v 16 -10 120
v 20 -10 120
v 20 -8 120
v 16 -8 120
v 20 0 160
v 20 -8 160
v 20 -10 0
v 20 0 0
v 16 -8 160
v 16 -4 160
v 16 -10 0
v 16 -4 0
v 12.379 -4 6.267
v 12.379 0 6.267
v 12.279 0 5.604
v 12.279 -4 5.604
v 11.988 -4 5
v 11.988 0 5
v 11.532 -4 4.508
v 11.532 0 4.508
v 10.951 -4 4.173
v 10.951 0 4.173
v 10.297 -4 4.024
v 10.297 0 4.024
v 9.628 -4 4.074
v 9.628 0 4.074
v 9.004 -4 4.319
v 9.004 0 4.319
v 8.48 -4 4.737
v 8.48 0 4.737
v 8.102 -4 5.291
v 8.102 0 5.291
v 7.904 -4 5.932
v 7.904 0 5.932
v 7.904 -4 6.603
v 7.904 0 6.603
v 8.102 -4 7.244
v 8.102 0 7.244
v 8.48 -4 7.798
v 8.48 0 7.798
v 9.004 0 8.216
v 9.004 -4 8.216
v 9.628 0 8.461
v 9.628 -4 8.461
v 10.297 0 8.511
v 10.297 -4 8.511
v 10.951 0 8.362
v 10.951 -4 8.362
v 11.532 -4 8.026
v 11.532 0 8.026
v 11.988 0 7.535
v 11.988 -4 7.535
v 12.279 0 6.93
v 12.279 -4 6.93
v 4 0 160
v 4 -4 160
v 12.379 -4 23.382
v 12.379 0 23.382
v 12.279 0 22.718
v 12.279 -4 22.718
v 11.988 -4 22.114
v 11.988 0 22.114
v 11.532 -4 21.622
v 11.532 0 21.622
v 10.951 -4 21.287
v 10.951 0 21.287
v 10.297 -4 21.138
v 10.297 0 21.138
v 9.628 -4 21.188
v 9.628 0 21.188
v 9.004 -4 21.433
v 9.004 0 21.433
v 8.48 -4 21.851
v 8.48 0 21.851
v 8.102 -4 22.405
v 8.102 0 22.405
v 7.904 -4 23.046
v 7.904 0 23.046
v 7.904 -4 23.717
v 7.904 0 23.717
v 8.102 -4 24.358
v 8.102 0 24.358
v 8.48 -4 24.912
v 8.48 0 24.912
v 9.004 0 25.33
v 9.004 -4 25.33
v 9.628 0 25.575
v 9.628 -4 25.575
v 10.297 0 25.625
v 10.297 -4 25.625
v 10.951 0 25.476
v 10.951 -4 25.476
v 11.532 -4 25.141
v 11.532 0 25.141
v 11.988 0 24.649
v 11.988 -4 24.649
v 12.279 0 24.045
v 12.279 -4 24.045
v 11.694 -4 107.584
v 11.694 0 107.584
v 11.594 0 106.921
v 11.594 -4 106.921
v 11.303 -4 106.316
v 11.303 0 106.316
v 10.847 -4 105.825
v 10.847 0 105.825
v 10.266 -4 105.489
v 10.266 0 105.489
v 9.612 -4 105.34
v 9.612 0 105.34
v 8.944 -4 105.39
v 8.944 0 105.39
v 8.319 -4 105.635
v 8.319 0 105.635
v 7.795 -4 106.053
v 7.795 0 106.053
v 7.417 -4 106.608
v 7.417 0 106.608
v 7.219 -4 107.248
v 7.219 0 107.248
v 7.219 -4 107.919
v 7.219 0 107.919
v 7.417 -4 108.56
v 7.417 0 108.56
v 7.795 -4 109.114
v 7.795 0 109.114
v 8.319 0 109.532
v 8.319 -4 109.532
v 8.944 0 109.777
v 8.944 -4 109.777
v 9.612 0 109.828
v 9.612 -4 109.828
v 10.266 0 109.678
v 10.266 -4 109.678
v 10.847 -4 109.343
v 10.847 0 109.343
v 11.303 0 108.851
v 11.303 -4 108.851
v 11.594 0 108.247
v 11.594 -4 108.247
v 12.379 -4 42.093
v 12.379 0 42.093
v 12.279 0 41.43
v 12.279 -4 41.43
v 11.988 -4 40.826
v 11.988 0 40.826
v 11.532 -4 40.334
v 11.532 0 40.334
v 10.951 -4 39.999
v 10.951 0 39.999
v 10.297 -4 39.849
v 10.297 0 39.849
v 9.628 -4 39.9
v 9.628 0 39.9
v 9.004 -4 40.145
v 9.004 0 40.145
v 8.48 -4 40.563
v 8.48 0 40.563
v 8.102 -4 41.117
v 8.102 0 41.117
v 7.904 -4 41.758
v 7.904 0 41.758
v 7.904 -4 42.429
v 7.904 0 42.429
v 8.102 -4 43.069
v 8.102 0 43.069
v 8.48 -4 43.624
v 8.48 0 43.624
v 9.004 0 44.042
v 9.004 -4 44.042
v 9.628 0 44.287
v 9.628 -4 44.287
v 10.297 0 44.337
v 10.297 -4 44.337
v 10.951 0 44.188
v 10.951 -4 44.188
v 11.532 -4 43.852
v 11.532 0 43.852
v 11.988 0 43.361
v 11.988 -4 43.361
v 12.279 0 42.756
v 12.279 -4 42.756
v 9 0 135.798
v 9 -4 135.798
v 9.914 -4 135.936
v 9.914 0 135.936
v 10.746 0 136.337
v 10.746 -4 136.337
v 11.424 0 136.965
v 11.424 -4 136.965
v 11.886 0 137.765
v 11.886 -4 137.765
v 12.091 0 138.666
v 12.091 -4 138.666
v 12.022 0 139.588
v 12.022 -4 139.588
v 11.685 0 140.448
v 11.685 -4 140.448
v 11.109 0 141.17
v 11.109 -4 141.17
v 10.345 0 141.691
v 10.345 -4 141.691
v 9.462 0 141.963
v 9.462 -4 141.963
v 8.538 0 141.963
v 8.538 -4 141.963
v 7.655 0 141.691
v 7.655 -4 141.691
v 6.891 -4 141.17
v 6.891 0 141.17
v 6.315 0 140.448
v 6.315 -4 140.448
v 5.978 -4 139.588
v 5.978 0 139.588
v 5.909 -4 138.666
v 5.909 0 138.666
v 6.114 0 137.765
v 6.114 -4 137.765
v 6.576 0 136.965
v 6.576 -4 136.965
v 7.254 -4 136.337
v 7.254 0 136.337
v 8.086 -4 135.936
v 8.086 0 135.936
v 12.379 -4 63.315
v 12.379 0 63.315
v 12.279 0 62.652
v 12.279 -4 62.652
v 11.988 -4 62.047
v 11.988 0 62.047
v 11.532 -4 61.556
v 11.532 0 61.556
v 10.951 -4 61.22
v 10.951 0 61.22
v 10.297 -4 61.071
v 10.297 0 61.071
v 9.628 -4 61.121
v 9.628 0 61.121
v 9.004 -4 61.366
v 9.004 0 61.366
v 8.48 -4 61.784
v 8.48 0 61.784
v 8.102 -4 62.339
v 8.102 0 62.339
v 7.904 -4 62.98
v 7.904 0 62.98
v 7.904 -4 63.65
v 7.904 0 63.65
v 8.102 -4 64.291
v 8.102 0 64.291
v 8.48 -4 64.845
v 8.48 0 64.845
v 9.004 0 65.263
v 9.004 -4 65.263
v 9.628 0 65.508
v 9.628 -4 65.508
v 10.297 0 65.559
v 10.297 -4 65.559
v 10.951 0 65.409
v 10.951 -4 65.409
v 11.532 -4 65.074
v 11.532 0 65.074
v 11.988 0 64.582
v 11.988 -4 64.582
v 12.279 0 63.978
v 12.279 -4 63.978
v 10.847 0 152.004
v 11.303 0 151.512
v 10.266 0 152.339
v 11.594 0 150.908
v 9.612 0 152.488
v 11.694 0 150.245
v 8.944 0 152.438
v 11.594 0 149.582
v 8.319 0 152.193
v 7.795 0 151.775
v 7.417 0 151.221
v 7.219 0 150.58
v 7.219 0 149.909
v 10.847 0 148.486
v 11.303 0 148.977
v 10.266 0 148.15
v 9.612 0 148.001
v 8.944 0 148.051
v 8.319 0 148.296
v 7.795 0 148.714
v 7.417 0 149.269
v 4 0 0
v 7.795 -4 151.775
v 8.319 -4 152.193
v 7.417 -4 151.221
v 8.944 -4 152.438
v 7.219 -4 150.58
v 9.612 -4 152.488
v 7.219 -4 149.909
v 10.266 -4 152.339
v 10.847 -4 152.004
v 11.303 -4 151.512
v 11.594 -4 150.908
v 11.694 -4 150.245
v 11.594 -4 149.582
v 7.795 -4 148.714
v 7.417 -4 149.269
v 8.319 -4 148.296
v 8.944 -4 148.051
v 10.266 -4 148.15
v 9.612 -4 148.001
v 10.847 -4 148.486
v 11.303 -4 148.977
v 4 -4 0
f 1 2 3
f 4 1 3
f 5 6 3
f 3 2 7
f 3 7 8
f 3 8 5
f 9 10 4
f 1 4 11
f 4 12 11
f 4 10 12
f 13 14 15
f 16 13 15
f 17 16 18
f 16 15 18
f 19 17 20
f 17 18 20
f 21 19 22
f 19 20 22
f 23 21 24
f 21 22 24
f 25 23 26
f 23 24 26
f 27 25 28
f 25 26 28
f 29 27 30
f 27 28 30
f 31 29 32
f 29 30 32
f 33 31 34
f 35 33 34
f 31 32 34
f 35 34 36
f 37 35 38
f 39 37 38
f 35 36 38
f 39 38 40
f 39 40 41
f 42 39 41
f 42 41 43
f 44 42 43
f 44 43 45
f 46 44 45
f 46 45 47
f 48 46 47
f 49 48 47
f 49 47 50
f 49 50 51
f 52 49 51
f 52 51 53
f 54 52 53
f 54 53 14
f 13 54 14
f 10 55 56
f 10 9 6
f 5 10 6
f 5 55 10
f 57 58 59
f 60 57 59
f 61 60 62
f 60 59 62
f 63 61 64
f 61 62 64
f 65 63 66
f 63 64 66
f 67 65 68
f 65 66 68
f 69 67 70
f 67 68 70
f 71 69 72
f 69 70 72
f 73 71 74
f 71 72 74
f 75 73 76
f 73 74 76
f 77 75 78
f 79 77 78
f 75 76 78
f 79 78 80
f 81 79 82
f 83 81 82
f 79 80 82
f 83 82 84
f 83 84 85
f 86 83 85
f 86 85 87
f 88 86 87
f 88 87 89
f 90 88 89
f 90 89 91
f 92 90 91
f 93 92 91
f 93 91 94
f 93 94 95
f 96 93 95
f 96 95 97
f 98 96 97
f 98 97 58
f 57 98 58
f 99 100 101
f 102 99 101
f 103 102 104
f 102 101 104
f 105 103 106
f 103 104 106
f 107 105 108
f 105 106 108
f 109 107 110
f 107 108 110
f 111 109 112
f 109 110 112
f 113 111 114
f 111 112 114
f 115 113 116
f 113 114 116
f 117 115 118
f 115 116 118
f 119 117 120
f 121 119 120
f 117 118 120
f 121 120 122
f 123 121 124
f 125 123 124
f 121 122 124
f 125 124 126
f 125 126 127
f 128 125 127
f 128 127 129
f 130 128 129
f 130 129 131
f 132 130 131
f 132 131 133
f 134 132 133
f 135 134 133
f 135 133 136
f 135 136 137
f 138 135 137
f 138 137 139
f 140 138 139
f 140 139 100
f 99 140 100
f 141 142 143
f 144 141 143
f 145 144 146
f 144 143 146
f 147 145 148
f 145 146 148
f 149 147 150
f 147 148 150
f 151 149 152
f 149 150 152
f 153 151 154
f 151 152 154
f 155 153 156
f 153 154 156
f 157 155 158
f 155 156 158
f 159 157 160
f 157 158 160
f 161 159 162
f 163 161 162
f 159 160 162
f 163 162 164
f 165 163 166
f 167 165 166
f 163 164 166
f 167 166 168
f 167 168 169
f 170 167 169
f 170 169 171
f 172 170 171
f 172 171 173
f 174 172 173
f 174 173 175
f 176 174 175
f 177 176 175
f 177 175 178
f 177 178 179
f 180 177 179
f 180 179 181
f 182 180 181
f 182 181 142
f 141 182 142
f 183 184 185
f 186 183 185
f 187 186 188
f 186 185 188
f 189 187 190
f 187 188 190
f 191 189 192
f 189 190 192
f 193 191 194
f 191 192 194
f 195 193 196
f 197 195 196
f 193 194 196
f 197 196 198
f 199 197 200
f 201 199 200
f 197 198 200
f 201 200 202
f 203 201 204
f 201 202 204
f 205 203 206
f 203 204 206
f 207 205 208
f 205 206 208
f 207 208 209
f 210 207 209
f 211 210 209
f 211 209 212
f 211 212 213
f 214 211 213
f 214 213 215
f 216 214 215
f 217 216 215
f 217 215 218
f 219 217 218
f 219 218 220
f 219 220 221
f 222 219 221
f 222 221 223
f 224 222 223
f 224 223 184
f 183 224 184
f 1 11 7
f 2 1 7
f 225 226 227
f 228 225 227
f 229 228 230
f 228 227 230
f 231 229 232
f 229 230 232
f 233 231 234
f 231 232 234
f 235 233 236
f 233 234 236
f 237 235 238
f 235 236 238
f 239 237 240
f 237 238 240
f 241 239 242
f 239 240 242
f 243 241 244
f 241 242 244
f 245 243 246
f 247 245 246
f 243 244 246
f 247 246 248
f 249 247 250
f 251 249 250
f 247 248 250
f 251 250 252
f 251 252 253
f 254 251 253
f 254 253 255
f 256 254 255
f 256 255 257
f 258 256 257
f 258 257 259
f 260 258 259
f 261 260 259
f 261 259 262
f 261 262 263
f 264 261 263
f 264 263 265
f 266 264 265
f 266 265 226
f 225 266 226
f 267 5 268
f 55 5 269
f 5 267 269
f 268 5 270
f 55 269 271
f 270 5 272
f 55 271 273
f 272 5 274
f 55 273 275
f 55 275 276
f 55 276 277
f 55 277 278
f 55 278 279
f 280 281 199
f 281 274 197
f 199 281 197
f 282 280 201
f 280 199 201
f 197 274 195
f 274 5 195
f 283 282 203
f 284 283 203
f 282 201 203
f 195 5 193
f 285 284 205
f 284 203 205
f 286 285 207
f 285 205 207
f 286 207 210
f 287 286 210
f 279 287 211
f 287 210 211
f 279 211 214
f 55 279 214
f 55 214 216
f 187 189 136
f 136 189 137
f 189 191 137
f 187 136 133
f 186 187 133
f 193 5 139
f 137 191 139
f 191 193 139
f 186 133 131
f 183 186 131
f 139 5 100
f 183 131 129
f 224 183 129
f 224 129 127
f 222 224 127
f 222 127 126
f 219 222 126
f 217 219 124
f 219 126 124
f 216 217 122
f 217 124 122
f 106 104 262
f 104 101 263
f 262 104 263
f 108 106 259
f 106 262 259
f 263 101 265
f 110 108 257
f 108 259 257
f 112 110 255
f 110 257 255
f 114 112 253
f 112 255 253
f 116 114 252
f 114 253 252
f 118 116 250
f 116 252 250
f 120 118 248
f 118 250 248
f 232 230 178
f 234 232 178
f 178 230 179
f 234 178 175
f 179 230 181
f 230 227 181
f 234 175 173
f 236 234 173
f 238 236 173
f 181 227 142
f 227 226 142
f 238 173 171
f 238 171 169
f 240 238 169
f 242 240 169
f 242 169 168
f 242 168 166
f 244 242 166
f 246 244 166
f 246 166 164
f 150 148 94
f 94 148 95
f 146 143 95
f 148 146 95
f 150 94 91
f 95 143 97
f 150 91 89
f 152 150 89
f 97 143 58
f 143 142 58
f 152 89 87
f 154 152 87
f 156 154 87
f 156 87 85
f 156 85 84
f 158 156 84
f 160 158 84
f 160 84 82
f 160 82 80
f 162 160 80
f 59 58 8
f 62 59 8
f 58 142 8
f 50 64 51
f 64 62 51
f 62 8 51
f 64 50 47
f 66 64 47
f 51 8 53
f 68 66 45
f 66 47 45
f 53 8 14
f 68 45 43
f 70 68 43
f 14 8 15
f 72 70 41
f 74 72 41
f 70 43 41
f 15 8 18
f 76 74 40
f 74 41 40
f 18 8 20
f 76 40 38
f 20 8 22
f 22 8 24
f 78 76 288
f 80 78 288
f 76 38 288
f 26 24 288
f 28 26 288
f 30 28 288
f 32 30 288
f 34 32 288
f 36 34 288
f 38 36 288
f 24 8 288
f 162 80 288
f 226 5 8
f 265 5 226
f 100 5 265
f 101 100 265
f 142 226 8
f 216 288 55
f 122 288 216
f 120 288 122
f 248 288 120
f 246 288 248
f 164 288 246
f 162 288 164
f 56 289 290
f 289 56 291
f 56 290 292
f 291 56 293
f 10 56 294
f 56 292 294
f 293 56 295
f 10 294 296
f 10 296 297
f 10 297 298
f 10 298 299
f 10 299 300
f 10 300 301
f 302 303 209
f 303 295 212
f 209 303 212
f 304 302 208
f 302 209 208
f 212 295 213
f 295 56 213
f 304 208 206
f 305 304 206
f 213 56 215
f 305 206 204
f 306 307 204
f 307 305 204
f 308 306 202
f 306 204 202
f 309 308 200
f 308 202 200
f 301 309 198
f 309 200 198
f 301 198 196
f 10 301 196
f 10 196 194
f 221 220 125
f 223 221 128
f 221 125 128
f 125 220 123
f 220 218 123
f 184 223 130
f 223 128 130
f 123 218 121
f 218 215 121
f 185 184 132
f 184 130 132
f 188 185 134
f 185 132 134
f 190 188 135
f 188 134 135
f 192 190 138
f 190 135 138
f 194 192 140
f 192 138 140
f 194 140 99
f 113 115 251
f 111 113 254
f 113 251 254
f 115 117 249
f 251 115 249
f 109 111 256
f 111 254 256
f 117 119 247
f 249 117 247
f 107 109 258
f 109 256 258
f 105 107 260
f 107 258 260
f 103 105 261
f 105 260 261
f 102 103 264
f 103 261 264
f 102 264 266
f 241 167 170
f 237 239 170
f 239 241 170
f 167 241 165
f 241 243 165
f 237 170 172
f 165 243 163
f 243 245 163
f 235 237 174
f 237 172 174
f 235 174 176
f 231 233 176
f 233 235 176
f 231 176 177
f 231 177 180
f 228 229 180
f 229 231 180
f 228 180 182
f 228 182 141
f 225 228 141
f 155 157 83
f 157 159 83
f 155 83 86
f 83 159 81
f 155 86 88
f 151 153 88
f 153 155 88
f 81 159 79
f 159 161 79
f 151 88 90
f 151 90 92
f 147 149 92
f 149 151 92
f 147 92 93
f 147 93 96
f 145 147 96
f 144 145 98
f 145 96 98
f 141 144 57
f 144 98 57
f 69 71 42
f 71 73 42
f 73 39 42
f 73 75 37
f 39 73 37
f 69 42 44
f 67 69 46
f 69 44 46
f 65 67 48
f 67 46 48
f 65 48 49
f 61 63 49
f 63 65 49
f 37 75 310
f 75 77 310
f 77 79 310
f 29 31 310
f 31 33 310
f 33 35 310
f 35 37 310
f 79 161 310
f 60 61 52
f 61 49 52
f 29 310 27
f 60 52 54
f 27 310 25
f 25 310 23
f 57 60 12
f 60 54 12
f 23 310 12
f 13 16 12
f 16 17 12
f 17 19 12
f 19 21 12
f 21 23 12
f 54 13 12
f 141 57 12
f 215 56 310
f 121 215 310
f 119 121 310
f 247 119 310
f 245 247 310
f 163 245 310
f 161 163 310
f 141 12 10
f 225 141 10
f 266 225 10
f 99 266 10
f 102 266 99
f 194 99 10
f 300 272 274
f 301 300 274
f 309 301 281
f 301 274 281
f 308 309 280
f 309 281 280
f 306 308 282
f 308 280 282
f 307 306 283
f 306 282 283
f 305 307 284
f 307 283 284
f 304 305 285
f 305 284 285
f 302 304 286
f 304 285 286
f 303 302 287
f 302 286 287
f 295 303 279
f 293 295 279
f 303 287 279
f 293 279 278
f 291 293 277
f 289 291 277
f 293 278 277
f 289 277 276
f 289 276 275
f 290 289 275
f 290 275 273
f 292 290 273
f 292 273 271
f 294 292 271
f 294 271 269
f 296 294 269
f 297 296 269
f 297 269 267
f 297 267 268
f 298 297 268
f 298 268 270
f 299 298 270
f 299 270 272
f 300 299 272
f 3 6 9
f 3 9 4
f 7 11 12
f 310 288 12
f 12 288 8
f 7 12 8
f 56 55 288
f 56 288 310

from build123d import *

# Parameters (mm, degrees)
BOSS_EXTRUDE1_DEPTH  = 160
SKETCH2_W            = 40
SKETCH2_H            = 2
CUT_EXTRUDE1_DEPTH   = 4
M4_CLEARANCE_HOLE1_D = 4.5
CUT_EXTRUDE2_REACH   = 163.357
SKETCH5_R            = 3.1


with BuildPart() as part:
    # Sketch1 → Boss-Extrude1 (new body)
    with BuildSketch(Plane.XY):
        Polygon((4, -4), (16, -4), (16, -10), (20, -10), (20, 0), (16, 0), (4, 0), align=None)
    extrude(amount=BOSS_EXTRUDE1_DEPTH)

    # Sketch2 → Cut-Extrude1 (cut)
    with BuildSketch(Plane(origin=(20, 0, 0), x_dir=(0, 0, -1), z_dir=(1, 0, 0))):
        with Locations((-140, -9)):
            Rectangle(SKETCH2_W, SKETCH2_H)
    extrude(amount=-CUT_EXTRUDE1_DEPTH, mode=Mode.SUBTRACT)

    # M4 Clearance Hole1 (through all)
    with Locations(Plane(origin=(0, -4, 0), x_dir=(-1, 0, 0), z_dir=(0, -1, 0))):
        with Locations((-10.128911503, -6.267286375), (-10.128911503, -23.38156703), (-10.128911503, -42.093180546), (-10.128911503, -63.314888558), (-9.444340277, -107.583827852), (-9.444340277, -150.244789298)):
            Hole(M4_CLEARANCE_HOLE1_D / 2)

    # Sketch5 → Cut-Extrude2 (cut, up to next)
    with BuildSketch(Plane.XZ.offset(4), mode=Mode.PRIVATE) as cut_extrude2_sk1:
        with Locations(Location((9, 138.897931951, 0), (0, 0, 270))):
            Circle(SKETCH5_R)
    cut_extrude2_tool1 = extrude(cut_extrude2_sk1.sketch, amount=-CUT_EXTRUDE2_REACH, mode=Mode.PRIVATE) & part.part
    add(cut_extrude2_tool1.solids().sort_by_distance((9, -4, 138.897932))[0], mode=Mode.SUBTRACT)


solid = part.part
